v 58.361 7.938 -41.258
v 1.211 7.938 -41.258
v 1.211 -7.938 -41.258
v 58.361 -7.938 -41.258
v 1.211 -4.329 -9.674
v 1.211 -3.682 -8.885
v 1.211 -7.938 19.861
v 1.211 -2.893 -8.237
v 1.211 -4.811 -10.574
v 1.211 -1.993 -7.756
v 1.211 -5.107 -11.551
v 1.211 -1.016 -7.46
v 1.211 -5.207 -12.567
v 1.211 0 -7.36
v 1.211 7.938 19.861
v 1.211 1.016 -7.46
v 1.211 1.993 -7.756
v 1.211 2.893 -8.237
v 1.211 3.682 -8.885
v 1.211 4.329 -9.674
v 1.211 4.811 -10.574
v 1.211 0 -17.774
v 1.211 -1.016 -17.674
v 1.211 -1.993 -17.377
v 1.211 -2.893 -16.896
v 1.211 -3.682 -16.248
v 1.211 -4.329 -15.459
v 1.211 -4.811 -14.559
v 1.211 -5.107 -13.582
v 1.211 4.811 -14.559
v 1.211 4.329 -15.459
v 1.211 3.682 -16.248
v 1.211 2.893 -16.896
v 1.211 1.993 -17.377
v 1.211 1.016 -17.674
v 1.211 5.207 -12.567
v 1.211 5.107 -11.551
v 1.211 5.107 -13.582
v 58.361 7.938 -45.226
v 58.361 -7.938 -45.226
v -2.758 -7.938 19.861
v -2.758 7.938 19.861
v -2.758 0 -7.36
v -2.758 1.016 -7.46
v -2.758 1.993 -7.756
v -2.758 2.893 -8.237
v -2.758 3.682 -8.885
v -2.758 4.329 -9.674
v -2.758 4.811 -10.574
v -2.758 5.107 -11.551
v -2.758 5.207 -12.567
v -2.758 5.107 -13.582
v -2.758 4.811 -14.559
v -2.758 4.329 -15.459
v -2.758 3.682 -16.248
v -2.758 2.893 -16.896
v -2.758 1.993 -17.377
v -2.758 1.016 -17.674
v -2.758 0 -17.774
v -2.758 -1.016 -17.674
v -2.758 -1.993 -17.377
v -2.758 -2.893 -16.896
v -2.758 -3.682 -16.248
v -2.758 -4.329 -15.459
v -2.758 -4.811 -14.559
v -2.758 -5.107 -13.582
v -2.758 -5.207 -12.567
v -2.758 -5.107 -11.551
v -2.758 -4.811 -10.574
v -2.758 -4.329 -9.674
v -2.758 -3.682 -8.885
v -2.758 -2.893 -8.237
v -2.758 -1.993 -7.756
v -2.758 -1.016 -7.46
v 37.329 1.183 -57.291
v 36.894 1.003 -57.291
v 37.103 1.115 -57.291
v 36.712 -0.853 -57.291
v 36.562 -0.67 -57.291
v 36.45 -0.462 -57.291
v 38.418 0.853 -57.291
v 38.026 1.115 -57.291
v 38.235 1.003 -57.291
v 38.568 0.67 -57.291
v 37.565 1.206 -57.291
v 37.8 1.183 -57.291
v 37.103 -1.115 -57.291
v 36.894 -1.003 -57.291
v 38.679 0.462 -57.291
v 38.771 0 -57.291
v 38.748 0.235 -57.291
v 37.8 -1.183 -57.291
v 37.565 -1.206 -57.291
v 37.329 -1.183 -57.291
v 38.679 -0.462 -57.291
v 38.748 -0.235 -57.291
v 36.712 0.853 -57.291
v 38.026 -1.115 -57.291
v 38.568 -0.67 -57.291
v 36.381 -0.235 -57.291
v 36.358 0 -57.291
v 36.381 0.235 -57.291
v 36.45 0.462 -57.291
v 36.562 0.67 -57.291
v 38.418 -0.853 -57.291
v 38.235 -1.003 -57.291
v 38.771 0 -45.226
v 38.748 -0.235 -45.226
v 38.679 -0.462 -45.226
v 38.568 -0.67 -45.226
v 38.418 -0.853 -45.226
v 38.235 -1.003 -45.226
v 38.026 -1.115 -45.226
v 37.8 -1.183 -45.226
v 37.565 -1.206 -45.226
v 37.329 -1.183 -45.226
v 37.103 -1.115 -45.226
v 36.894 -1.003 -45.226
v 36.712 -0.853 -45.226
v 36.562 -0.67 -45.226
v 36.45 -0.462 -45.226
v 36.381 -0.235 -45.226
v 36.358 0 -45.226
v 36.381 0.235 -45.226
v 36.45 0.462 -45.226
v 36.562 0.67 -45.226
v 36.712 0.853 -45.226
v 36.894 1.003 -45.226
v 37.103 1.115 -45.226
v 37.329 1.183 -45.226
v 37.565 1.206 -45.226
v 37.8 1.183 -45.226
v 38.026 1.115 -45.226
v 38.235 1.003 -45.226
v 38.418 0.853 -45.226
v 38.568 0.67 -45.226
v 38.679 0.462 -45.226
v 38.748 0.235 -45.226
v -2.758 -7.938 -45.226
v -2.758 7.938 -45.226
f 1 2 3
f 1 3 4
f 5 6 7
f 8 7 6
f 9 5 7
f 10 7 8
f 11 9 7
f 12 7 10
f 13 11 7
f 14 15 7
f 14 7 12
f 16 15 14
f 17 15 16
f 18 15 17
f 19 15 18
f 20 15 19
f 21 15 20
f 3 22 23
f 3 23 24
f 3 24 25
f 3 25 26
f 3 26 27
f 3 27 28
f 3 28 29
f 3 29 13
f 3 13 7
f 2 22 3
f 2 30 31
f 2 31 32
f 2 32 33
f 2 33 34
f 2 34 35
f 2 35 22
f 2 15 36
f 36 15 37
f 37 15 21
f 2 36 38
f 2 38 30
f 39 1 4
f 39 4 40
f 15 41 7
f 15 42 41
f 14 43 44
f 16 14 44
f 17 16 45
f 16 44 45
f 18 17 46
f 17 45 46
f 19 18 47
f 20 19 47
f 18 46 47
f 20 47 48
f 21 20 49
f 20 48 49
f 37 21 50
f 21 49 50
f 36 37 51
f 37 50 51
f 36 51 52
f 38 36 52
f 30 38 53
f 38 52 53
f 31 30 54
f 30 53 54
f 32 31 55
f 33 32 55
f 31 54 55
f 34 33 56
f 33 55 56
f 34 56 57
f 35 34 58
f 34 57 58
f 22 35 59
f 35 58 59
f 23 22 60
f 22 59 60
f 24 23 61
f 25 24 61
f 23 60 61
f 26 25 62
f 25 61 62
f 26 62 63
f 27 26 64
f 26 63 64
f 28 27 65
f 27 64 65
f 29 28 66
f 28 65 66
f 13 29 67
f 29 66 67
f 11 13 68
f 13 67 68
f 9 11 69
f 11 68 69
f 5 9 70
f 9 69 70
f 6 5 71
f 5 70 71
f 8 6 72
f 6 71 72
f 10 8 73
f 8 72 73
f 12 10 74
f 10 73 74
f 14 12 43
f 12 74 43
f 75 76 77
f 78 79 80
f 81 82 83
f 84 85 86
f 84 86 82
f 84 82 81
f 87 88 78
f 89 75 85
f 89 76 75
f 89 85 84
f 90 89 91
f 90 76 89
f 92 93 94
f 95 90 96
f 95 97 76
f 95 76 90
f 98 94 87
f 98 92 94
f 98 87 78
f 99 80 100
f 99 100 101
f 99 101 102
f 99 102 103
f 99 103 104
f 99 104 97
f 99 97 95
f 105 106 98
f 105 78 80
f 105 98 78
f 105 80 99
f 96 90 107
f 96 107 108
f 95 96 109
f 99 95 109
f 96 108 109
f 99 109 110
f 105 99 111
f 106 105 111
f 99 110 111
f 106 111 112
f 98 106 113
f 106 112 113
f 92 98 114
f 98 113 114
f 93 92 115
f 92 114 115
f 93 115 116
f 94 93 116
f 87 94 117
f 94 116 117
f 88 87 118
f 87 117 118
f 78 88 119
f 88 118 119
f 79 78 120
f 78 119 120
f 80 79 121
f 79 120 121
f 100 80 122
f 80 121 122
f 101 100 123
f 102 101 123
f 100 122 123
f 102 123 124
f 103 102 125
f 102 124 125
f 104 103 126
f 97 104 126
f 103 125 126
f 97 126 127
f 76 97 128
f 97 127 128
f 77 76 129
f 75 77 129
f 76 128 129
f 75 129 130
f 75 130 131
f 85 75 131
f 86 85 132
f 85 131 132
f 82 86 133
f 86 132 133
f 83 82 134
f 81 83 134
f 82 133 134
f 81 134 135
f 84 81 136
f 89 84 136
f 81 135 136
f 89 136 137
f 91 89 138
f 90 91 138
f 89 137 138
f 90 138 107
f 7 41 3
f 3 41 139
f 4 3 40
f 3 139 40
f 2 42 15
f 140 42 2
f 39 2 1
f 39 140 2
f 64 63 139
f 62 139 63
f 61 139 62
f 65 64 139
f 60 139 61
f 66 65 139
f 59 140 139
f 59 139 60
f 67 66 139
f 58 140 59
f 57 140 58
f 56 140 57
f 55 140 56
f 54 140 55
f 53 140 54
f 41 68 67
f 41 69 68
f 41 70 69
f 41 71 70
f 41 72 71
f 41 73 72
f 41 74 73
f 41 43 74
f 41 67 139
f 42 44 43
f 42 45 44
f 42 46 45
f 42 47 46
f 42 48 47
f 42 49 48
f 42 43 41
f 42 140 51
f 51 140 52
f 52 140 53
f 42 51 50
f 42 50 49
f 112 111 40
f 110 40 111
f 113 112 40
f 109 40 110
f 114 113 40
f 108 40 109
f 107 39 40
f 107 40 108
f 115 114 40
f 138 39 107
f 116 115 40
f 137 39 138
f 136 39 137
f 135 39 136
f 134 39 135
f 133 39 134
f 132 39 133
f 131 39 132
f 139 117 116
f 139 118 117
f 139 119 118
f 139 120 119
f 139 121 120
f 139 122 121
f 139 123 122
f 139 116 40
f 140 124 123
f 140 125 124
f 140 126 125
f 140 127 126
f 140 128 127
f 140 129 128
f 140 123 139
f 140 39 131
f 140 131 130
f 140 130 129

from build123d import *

# Parameters (mm, degrees)
BOSS_EXTRUDE1_DEPTH = 7.9375
SKETCH3_R           = 5.207
CUT_EXTRUDE1_DEPTH  = 3.96875
SKETCH4_R           = 1.2065
BOSS_EXTRUDE2_DEPTH = 12.065


with BuildPart() as part:
    # Sketch1 → Boss-Extrude1 (new, symmetric)
    with BuildSketch(Plane(origin=(0, 0, 0), x_dir=(1, 0, 0), z_dir=(0, 1, 0))):
        Polygon((-2.757708096, -19.86108723), (1.211041904, -19.86108723), (1.211041904, 41.25766277), (58.361041904, 41.25766277), (58.361041904, 45.22641277), (6.27967861, 45.22641277), (-2.757708096, 45.22641277), align=None)
    extrude(amount=BOSS_EXTRUDE1_DEPTH, both=True)

    # Sketch3 → Cut-Extrude1 (cut)
    with BuildSketch(Plane.ZY.offset(2.757708096)):
        with Locations((-12.566559842, 0)):
            Circle(SKETCH3_R)
    extrude(amount=-CUT_EXTRUDE1_DEPTH, mode=Mode.SUBTRACT)

    # Sketch4 → Boss-Extrude2 (add)
    with BuildSketch(Plane(origin=(0, 0, -45.22641277), x_dir=(-1, 0, 0), z_dir=(0, 0, -1))):
        with Locations(Location((-37.564791904, 0, 0), (0, 0, 180))):
            Circle(SKETCH4_R)
    extrude(amount=BOSS_EXTRUDE2_DEPTH)


solid = part.part
